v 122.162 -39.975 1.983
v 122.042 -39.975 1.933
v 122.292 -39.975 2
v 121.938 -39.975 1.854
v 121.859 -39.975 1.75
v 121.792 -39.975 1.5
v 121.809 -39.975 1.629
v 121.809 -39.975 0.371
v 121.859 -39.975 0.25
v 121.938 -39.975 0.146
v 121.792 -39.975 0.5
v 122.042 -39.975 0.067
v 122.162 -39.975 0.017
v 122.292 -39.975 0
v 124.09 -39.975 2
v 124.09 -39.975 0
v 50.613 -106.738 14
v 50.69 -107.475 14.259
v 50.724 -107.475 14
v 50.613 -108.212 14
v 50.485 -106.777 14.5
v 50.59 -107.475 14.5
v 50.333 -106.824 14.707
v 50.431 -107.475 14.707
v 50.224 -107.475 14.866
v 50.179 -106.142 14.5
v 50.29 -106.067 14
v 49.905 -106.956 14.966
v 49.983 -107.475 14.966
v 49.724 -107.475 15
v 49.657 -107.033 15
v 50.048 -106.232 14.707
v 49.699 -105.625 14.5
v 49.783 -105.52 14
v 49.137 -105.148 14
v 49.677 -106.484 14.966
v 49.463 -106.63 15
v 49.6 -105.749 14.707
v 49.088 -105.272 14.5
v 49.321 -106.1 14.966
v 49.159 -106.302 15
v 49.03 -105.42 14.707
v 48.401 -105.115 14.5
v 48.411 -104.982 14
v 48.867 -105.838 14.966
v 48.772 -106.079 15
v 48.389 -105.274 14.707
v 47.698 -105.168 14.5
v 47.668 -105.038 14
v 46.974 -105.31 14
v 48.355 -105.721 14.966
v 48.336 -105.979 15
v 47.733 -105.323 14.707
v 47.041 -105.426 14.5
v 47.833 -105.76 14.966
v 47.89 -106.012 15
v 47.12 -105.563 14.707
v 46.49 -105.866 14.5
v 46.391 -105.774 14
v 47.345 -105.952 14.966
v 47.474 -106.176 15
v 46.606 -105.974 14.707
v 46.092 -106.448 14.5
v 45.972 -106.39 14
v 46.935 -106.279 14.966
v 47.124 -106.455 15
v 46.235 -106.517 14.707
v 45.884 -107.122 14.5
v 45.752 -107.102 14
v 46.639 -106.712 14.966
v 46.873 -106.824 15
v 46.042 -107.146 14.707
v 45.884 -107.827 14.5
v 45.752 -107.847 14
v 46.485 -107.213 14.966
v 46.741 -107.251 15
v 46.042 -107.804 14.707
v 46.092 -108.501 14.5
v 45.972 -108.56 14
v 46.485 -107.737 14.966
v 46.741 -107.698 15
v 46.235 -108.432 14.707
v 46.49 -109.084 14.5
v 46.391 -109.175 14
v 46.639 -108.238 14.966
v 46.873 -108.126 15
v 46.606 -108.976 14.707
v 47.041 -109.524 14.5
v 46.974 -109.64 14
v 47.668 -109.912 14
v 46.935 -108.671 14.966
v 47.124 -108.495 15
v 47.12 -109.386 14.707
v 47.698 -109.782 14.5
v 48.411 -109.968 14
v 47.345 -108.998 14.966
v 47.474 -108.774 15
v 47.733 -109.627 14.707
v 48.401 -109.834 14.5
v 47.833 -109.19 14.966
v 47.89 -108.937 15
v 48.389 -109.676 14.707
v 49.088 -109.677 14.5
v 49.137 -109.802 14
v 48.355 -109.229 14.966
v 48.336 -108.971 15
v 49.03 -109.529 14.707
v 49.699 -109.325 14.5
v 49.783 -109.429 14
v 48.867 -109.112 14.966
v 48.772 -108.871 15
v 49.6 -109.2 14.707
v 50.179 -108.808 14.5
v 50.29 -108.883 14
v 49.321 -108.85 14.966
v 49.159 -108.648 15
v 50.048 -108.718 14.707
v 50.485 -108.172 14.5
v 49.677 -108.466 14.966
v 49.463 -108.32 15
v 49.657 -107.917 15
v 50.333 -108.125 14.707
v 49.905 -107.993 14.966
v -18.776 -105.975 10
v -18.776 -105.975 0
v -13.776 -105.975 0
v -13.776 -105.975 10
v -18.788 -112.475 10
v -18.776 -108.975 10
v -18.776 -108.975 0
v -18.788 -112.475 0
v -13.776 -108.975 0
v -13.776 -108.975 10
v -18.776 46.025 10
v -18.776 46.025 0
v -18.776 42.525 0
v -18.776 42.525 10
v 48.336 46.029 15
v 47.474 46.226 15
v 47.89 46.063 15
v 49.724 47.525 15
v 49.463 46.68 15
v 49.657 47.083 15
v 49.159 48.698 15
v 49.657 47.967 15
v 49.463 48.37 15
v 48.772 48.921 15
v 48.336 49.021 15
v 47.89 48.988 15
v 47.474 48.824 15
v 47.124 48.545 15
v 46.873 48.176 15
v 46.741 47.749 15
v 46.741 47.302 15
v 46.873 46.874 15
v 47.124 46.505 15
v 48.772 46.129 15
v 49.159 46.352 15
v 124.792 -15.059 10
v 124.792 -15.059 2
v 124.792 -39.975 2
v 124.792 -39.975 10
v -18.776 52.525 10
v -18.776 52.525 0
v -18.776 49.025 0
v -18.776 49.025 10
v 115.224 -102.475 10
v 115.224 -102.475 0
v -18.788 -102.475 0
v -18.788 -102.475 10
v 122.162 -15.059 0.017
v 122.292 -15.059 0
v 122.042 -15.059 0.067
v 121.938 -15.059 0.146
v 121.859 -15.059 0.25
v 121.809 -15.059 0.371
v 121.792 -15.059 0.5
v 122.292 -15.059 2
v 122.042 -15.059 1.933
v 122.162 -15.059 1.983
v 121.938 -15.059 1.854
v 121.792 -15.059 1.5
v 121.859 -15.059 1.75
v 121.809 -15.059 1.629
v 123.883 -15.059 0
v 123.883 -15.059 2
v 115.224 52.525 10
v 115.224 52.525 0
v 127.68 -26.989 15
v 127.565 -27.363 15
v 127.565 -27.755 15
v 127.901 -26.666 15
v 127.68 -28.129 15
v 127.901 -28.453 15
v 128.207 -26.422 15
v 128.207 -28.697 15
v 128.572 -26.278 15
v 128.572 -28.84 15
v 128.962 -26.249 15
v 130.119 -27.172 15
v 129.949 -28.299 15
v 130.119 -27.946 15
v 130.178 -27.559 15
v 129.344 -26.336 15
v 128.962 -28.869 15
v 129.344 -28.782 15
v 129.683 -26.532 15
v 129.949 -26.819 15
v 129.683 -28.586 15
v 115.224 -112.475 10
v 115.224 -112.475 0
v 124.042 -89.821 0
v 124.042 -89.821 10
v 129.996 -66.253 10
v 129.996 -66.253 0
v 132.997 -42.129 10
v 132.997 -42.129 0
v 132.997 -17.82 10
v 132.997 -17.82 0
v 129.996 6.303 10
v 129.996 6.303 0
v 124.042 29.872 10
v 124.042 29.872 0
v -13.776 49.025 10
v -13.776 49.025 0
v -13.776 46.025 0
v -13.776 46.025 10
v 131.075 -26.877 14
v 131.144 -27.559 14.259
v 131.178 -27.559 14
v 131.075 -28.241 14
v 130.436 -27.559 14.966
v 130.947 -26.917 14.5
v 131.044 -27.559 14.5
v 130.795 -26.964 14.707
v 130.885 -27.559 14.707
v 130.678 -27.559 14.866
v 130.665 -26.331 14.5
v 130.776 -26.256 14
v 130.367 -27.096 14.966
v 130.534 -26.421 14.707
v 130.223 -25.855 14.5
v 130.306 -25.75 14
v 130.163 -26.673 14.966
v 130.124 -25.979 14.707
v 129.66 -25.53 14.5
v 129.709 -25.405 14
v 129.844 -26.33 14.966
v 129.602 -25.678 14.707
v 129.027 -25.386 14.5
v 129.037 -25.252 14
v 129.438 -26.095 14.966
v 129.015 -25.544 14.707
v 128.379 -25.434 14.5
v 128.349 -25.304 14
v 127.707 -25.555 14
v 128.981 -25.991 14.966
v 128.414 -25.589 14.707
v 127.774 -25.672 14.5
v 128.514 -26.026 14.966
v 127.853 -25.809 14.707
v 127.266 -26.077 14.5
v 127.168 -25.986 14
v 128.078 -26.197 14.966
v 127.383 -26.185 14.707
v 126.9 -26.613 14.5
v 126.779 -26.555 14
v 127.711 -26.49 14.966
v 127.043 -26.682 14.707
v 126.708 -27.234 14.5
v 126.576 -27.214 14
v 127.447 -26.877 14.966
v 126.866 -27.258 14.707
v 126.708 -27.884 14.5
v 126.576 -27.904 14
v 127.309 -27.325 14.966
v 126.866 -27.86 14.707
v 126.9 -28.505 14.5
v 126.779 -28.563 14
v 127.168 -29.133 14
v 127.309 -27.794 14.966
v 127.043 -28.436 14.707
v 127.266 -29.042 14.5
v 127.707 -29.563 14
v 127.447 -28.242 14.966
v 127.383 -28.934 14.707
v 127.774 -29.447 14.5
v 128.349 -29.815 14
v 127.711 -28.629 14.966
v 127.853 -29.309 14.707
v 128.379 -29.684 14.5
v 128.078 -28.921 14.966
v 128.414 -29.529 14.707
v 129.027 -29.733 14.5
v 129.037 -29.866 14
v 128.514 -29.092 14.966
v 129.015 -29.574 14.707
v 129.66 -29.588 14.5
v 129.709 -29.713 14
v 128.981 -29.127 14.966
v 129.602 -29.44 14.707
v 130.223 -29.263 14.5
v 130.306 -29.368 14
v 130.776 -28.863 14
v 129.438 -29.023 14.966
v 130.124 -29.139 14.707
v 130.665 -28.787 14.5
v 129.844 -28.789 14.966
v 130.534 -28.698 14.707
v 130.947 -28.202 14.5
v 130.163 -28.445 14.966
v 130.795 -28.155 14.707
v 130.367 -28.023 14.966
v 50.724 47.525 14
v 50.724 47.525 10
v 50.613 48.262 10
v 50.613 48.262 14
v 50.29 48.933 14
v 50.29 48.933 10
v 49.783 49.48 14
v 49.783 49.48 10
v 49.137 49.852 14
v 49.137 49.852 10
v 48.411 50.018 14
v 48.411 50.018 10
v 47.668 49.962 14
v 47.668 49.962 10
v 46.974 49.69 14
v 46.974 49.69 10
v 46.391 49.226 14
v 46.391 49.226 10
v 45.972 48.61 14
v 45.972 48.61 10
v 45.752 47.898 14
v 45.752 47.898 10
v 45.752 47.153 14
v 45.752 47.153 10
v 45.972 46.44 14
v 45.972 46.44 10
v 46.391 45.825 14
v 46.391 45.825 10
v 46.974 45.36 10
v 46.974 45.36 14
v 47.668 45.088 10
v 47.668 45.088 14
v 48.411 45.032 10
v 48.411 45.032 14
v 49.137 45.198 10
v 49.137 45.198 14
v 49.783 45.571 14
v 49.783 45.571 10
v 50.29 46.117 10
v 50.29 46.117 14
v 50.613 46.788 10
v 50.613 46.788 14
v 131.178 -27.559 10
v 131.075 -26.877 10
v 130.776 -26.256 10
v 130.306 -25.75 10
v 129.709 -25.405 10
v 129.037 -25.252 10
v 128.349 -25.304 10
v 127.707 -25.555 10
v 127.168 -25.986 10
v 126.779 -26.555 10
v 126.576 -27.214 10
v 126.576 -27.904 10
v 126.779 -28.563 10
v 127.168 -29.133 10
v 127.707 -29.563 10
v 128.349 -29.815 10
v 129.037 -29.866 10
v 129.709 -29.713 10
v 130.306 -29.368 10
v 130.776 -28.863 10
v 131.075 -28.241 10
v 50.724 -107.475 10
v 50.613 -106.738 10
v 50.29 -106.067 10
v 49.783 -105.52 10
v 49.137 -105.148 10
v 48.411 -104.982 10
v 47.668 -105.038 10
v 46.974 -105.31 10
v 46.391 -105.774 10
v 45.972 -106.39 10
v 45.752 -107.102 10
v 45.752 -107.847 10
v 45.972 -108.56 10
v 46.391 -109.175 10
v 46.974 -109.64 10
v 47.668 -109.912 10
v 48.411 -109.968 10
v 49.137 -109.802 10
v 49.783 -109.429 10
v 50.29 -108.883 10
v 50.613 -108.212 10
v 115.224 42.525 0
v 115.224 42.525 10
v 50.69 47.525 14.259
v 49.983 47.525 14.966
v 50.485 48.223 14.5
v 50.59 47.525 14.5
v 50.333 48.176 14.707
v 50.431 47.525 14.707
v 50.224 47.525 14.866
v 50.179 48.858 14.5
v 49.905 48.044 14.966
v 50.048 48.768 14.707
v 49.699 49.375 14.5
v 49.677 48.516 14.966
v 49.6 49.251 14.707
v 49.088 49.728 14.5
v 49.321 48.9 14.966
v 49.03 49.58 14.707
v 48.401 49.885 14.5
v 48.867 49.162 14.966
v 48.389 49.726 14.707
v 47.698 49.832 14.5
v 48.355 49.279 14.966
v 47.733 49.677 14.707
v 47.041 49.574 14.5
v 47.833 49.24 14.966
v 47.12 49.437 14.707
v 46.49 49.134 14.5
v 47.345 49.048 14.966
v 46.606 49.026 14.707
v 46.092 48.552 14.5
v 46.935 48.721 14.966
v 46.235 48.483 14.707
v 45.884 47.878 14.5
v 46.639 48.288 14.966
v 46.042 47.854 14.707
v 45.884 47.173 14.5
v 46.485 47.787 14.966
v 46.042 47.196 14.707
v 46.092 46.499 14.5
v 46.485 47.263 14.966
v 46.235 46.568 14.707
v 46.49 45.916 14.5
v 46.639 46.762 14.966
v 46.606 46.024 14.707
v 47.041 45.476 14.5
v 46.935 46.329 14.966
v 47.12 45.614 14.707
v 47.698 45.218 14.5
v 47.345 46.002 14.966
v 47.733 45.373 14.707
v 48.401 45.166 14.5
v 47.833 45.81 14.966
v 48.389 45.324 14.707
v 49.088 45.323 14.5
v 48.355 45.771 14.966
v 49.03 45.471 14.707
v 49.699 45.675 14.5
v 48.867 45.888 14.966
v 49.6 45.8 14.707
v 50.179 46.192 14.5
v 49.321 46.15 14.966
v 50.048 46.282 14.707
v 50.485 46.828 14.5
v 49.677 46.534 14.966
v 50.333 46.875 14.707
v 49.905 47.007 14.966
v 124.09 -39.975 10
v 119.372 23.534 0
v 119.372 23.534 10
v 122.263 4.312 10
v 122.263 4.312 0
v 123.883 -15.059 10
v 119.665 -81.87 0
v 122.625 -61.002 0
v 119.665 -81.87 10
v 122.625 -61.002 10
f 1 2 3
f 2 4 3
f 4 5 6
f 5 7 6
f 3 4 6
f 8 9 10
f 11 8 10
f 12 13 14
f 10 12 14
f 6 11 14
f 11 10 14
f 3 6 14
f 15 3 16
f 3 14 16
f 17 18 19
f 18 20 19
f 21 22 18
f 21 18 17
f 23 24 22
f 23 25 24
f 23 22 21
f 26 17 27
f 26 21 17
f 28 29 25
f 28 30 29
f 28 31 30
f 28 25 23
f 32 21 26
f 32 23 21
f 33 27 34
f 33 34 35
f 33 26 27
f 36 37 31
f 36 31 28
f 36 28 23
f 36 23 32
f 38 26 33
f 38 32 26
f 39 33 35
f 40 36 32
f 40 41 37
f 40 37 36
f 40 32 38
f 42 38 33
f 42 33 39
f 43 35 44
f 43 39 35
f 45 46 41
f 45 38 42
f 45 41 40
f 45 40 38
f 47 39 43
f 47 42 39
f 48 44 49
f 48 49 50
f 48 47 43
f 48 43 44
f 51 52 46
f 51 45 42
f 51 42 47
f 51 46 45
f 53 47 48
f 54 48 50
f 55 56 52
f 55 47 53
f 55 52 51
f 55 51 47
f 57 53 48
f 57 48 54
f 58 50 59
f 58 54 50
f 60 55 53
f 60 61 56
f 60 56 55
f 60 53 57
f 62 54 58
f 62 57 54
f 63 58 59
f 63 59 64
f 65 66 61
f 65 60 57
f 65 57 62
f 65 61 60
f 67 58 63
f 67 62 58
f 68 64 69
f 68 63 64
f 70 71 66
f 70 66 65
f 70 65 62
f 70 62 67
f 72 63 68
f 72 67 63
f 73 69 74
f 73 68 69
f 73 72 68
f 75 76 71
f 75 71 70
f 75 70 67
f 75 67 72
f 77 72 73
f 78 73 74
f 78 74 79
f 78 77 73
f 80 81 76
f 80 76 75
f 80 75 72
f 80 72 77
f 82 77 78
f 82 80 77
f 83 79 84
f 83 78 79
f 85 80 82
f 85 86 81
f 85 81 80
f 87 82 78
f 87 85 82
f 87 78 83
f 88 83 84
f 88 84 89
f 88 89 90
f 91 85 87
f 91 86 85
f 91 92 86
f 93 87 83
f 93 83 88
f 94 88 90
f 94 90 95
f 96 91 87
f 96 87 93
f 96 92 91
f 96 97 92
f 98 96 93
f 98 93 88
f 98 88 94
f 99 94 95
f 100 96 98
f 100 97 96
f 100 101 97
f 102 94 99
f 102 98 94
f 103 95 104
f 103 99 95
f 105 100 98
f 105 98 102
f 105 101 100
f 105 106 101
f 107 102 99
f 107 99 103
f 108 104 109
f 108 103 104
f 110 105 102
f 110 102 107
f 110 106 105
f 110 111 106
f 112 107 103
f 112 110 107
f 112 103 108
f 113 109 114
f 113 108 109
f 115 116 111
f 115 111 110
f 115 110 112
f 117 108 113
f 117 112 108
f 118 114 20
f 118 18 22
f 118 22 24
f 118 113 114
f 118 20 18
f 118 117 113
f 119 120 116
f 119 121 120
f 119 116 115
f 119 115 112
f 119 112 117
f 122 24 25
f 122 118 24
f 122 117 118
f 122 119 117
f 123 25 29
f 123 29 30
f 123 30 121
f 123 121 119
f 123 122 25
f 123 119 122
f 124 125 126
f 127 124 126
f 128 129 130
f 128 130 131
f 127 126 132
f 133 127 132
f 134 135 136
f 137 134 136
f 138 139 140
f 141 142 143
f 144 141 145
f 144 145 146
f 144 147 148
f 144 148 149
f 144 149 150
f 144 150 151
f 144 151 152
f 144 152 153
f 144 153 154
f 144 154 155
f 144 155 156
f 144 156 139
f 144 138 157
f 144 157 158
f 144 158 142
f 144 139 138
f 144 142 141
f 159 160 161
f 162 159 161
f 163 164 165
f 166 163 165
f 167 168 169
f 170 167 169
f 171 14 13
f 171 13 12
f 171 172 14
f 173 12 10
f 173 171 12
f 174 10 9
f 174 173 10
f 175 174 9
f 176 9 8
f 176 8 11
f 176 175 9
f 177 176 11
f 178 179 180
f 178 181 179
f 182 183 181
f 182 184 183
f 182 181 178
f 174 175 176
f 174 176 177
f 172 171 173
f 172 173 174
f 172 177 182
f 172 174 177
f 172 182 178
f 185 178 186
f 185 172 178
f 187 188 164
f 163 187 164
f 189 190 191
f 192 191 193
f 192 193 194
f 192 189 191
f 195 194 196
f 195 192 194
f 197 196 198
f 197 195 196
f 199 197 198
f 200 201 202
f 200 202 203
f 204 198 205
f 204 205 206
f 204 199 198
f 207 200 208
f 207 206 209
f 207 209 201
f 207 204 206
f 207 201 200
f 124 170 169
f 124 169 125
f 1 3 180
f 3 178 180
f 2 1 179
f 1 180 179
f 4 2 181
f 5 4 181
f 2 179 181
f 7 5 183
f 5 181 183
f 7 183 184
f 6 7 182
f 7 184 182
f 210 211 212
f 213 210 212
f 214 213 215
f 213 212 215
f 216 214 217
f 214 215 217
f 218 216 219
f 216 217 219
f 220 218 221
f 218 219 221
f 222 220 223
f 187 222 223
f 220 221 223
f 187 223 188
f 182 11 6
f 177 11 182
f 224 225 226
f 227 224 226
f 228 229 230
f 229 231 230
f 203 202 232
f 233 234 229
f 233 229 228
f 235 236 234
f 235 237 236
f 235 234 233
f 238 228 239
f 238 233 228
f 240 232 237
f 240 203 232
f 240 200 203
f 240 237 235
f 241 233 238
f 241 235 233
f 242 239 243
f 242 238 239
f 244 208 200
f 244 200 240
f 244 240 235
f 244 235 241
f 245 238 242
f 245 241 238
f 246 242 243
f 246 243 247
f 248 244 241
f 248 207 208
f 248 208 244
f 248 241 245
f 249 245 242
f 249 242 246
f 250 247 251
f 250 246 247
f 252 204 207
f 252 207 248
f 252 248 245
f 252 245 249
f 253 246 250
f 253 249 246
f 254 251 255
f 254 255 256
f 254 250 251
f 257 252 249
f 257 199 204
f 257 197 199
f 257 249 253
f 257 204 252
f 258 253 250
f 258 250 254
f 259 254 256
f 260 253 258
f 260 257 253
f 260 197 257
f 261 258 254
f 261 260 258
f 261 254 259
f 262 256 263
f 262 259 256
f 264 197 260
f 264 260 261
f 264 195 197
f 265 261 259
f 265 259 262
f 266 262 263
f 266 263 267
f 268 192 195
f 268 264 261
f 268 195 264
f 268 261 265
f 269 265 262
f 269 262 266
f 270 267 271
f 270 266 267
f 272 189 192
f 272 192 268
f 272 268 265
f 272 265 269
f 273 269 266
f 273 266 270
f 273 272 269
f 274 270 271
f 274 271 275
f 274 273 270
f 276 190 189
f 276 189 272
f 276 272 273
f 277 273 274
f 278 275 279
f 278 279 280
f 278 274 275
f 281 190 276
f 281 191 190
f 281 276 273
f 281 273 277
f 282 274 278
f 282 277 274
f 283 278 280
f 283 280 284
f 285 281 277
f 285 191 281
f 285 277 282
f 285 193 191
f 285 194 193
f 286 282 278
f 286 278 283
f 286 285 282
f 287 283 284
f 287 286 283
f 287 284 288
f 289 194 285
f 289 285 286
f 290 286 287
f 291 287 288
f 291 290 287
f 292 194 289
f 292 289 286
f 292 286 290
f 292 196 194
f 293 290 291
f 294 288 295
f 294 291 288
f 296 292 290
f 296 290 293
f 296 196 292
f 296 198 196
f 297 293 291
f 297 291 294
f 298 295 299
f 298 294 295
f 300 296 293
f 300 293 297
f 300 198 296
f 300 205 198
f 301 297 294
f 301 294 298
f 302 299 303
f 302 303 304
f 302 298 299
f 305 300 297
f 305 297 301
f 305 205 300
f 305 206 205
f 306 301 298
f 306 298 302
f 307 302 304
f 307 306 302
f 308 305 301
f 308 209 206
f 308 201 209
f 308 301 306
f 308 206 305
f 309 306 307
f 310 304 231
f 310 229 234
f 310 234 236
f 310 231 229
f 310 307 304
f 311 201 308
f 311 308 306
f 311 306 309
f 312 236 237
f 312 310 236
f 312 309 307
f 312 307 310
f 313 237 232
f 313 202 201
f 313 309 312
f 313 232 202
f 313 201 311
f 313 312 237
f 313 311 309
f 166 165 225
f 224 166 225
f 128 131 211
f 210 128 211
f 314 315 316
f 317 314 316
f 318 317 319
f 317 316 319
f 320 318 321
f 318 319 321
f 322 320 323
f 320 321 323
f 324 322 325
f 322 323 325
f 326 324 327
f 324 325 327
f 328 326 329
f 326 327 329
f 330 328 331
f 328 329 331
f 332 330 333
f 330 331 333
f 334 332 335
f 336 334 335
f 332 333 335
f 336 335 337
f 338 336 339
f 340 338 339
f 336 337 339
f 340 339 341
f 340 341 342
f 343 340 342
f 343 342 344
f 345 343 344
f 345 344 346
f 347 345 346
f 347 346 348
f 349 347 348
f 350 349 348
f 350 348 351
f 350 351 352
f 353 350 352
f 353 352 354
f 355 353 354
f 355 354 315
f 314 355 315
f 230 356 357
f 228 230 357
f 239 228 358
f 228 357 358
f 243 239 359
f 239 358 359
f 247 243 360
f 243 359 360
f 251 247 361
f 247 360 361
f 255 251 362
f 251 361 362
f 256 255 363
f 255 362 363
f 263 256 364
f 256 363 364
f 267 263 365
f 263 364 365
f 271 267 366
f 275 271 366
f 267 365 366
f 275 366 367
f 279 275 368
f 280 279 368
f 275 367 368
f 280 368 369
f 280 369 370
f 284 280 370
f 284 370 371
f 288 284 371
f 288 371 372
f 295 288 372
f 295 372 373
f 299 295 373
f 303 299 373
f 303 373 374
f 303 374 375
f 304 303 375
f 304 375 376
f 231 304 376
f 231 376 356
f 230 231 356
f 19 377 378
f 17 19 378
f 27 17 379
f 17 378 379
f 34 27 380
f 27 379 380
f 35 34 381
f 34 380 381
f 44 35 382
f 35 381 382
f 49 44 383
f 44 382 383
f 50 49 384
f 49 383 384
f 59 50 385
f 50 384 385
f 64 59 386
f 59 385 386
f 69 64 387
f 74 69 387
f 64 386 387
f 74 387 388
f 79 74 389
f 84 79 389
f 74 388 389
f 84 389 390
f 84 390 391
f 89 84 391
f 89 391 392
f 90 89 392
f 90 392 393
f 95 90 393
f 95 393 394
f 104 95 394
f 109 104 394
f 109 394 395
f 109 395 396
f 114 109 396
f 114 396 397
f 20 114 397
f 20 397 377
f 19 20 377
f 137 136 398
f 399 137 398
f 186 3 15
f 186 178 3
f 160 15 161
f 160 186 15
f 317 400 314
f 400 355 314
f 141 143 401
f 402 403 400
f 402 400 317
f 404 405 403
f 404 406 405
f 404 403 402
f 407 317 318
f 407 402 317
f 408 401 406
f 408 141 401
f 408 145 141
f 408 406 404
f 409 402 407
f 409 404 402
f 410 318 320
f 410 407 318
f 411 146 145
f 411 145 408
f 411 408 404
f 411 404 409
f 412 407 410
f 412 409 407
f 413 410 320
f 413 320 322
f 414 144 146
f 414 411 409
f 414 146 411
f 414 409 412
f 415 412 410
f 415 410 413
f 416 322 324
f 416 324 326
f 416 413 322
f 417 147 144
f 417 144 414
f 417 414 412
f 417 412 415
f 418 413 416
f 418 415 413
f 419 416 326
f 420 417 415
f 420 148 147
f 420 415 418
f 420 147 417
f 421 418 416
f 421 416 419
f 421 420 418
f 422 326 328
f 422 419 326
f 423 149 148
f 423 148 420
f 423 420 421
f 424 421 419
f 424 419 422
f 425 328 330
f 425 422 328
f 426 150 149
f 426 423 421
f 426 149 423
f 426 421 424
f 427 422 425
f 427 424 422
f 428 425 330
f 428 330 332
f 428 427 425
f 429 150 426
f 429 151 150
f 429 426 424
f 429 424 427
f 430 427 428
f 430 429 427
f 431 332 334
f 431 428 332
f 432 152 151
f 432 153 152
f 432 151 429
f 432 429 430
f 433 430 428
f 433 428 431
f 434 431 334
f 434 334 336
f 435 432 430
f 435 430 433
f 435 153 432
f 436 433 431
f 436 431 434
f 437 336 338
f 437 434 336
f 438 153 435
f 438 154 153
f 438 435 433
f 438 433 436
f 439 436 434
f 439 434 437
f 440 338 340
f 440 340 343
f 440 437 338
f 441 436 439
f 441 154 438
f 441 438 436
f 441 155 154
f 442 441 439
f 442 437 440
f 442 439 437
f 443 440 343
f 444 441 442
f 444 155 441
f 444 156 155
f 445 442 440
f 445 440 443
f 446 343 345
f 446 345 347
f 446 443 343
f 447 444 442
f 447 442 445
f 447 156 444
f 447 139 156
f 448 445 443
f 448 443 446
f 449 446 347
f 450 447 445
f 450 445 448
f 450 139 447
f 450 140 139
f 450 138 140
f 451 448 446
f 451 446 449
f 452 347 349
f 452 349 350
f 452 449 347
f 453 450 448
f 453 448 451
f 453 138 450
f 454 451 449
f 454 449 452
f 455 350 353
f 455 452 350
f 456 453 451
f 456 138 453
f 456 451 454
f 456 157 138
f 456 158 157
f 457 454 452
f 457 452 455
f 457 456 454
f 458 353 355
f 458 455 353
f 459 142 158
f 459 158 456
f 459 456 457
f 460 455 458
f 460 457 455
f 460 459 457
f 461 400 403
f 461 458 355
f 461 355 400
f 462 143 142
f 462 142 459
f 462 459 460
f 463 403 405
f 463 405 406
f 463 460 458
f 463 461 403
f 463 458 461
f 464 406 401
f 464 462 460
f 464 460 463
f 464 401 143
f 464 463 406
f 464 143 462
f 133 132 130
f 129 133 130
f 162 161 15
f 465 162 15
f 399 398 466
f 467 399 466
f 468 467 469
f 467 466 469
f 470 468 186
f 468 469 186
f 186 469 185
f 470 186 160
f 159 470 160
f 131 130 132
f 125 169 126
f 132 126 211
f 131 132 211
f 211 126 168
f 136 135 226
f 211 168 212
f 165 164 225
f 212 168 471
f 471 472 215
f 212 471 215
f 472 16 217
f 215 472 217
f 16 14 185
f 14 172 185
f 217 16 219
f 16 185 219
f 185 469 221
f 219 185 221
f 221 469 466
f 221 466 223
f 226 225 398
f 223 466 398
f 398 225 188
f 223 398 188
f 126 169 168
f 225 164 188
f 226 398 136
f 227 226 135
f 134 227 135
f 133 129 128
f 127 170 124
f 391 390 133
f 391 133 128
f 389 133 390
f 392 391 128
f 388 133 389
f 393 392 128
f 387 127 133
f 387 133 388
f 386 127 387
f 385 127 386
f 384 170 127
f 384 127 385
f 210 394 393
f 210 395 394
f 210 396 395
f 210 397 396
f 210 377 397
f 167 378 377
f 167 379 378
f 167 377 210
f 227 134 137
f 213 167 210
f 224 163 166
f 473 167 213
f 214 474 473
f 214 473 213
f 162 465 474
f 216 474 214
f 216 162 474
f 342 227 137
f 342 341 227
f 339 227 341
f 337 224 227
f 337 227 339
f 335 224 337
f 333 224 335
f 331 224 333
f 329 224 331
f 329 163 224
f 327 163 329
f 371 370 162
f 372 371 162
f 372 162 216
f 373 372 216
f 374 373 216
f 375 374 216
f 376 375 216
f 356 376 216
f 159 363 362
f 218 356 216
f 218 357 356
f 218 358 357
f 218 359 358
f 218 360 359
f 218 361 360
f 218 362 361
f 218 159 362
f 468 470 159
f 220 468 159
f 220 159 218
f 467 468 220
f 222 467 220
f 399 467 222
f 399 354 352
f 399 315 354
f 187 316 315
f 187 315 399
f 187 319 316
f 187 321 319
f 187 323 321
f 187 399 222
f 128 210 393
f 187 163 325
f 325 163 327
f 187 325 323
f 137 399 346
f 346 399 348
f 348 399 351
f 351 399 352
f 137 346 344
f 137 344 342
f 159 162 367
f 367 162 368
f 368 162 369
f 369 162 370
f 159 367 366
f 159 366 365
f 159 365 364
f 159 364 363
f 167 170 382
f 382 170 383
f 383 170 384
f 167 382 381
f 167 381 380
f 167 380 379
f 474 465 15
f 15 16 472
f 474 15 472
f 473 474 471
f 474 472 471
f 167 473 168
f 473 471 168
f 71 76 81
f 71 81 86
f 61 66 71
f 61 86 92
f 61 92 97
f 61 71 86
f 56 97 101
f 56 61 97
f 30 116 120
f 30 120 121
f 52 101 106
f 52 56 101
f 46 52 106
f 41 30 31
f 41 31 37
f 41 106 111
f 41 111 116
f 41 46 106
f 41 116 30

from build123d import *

# Parameters (mm, degrees)
ESQUISSE1_R         = 2.5
ESQUISSE1_R_2       = 2.313714448
BOSS_EXTRU_9_DEPTH  = 10
ESQUISSE1_31_W      = 3
ESQUISSE1_31_H      = 24.915622322
BOSS_EXTRU_10_DEPTH = 2
ESQUISSE1_32_R      = 2.313714448
ESQUISSE1_32_R_2    = 2.5
BOSS_EXTRU_11_DEPTH = 15
CONG_1_R            = 1
CONG_2_R            = 0.5


with BuildPart() as part:
    # Esquisse1 → Boss.-Extru.9 (new body)
    with BuildSketch(Plane.XY):
        with BuildLine():
            Line((115.224013388, -102.474855986), (-18.787756311, -102.474855986))
            Line((-18.787756311, -102.474855986), (-18.775986612, -105.974855986))
            Line((-18.775986612, -105.974855986), (-13.775986612, -105.974855986))
            Line((-13.775986612, -105.974855986), (-13.775986612, -108.974855986))
            Line((-13.775986612, -108.974855986), (-18.775986612, -108.974855986))
            Line((-18.775986612, -108.974855986), (-18.787756311, -112.474855986))
            Line((-18.787756311, -112.474855986), (115.224013388, -112.474855986))
            ThreePointArc((115.224013388, -112.474855986), (133.372740942, -29.974855986), (115.224013388, 52.525144014))
            Line((115.224013388, 52.525144014), (-18.775986612, 52.525144014))
            Line((-18.775986612, 52.525144014), (-18.775986612, 49.025144014))
            Line((-18.775986612, 49.025144014), (-13.775986612, 49.025144014))
            Line((-13.775986612, 49.025144014), (-13.775986612, 46.025144014))
            Line((-13.775986612, 46.025144014), (-18.775986612, 46.025144014))
            Line((-18.775986612, 46.025144014), (-18.775986612, 42.525144014))
            Line((-18.775986612, 42.525144014), (115.224013388, 42.525144014))
            ThreePointArc((115.224013388, 42.525144014), (120.975797216, 13.946843769), (123.882639826, -15.059233664))
            Line((123.882639826, -15.059233664), (124.791681137, -15.059233664))
            Line((124.791681137, -15.059233664), (124.791681137, -39.974855986))
            Line((124.791681137, -39.974855986), (124.090146574, -39.974855986))
            ThreePointArc((124.090146574, -39.974855986), (121.331451242, -71.462379164), (115.224013388, -102.474855986))
        make_face()
        with Locations((48.224013388, -107.474855986)):
            Circle(ESQUISSE1_R, mode=Mode.SUBTRACT)
        with Locations((128.863881441, -27.559233664)):
            Circle(ESQUISSE1_R_2, mode=Mode.SUBTRACT)
        with Locations((48.224013388, 47.525144014)):
            Circle(ESQUISSE1_R, mode=Mode.SUBTRACT)
    extrude(amount=BOSS_EXTRU_9_DEPTH)

    # Esquisse1<31> → Boss.-Extru.10 (add)
    with BuildSketch(Plane.XY):
        with Locations((123.291681137, -27.517044825)):
            Rectangle(ESQUISSE1_31_W, ESQUISSE1_31_H)
    extrude(amount=BOSS_EXTRU_10_DEPTH)

    # Esquisse1<32> → Boss.-Extru.11 (add)
    with BuildSketch(Plane.XY):
        with Locations((128.863881441, -27.559233664)):
            Circle(ESQUISSE1_32_R)
        with Locations((48.224013388, -107.474855986)):
            Circle(ESQUISSE1_32_R_2)
        with Locations((48.224013388, 47.525144014)):
            Circle(ESQUISSE1_32_R_2)
    extrude(amount=BOSS_EXTRU_11_DEPTH)

    # Congé1
    cong_1_edges = [part.edges().sort_by_distance(p)[0] for p in [
        (45.724013388, 47.525144014, 15),
        (126.550166993, -27.559233664, 15),
        (45.724013388, -107.474855986, 15),
    ]]
    fillet(cong_1_edges, radius=CONG_1_R)

    # Congé2
    cong_2_edges = [part.edges().sort_by_distance(p)[0] for p in [
        (121.791681137, -27.517044825, 0),
        (121.791681137, -27.517044825, 2),
    ]]
    fillet(cong_2_edges, radius=CONG_2_R)


solid = part.part
